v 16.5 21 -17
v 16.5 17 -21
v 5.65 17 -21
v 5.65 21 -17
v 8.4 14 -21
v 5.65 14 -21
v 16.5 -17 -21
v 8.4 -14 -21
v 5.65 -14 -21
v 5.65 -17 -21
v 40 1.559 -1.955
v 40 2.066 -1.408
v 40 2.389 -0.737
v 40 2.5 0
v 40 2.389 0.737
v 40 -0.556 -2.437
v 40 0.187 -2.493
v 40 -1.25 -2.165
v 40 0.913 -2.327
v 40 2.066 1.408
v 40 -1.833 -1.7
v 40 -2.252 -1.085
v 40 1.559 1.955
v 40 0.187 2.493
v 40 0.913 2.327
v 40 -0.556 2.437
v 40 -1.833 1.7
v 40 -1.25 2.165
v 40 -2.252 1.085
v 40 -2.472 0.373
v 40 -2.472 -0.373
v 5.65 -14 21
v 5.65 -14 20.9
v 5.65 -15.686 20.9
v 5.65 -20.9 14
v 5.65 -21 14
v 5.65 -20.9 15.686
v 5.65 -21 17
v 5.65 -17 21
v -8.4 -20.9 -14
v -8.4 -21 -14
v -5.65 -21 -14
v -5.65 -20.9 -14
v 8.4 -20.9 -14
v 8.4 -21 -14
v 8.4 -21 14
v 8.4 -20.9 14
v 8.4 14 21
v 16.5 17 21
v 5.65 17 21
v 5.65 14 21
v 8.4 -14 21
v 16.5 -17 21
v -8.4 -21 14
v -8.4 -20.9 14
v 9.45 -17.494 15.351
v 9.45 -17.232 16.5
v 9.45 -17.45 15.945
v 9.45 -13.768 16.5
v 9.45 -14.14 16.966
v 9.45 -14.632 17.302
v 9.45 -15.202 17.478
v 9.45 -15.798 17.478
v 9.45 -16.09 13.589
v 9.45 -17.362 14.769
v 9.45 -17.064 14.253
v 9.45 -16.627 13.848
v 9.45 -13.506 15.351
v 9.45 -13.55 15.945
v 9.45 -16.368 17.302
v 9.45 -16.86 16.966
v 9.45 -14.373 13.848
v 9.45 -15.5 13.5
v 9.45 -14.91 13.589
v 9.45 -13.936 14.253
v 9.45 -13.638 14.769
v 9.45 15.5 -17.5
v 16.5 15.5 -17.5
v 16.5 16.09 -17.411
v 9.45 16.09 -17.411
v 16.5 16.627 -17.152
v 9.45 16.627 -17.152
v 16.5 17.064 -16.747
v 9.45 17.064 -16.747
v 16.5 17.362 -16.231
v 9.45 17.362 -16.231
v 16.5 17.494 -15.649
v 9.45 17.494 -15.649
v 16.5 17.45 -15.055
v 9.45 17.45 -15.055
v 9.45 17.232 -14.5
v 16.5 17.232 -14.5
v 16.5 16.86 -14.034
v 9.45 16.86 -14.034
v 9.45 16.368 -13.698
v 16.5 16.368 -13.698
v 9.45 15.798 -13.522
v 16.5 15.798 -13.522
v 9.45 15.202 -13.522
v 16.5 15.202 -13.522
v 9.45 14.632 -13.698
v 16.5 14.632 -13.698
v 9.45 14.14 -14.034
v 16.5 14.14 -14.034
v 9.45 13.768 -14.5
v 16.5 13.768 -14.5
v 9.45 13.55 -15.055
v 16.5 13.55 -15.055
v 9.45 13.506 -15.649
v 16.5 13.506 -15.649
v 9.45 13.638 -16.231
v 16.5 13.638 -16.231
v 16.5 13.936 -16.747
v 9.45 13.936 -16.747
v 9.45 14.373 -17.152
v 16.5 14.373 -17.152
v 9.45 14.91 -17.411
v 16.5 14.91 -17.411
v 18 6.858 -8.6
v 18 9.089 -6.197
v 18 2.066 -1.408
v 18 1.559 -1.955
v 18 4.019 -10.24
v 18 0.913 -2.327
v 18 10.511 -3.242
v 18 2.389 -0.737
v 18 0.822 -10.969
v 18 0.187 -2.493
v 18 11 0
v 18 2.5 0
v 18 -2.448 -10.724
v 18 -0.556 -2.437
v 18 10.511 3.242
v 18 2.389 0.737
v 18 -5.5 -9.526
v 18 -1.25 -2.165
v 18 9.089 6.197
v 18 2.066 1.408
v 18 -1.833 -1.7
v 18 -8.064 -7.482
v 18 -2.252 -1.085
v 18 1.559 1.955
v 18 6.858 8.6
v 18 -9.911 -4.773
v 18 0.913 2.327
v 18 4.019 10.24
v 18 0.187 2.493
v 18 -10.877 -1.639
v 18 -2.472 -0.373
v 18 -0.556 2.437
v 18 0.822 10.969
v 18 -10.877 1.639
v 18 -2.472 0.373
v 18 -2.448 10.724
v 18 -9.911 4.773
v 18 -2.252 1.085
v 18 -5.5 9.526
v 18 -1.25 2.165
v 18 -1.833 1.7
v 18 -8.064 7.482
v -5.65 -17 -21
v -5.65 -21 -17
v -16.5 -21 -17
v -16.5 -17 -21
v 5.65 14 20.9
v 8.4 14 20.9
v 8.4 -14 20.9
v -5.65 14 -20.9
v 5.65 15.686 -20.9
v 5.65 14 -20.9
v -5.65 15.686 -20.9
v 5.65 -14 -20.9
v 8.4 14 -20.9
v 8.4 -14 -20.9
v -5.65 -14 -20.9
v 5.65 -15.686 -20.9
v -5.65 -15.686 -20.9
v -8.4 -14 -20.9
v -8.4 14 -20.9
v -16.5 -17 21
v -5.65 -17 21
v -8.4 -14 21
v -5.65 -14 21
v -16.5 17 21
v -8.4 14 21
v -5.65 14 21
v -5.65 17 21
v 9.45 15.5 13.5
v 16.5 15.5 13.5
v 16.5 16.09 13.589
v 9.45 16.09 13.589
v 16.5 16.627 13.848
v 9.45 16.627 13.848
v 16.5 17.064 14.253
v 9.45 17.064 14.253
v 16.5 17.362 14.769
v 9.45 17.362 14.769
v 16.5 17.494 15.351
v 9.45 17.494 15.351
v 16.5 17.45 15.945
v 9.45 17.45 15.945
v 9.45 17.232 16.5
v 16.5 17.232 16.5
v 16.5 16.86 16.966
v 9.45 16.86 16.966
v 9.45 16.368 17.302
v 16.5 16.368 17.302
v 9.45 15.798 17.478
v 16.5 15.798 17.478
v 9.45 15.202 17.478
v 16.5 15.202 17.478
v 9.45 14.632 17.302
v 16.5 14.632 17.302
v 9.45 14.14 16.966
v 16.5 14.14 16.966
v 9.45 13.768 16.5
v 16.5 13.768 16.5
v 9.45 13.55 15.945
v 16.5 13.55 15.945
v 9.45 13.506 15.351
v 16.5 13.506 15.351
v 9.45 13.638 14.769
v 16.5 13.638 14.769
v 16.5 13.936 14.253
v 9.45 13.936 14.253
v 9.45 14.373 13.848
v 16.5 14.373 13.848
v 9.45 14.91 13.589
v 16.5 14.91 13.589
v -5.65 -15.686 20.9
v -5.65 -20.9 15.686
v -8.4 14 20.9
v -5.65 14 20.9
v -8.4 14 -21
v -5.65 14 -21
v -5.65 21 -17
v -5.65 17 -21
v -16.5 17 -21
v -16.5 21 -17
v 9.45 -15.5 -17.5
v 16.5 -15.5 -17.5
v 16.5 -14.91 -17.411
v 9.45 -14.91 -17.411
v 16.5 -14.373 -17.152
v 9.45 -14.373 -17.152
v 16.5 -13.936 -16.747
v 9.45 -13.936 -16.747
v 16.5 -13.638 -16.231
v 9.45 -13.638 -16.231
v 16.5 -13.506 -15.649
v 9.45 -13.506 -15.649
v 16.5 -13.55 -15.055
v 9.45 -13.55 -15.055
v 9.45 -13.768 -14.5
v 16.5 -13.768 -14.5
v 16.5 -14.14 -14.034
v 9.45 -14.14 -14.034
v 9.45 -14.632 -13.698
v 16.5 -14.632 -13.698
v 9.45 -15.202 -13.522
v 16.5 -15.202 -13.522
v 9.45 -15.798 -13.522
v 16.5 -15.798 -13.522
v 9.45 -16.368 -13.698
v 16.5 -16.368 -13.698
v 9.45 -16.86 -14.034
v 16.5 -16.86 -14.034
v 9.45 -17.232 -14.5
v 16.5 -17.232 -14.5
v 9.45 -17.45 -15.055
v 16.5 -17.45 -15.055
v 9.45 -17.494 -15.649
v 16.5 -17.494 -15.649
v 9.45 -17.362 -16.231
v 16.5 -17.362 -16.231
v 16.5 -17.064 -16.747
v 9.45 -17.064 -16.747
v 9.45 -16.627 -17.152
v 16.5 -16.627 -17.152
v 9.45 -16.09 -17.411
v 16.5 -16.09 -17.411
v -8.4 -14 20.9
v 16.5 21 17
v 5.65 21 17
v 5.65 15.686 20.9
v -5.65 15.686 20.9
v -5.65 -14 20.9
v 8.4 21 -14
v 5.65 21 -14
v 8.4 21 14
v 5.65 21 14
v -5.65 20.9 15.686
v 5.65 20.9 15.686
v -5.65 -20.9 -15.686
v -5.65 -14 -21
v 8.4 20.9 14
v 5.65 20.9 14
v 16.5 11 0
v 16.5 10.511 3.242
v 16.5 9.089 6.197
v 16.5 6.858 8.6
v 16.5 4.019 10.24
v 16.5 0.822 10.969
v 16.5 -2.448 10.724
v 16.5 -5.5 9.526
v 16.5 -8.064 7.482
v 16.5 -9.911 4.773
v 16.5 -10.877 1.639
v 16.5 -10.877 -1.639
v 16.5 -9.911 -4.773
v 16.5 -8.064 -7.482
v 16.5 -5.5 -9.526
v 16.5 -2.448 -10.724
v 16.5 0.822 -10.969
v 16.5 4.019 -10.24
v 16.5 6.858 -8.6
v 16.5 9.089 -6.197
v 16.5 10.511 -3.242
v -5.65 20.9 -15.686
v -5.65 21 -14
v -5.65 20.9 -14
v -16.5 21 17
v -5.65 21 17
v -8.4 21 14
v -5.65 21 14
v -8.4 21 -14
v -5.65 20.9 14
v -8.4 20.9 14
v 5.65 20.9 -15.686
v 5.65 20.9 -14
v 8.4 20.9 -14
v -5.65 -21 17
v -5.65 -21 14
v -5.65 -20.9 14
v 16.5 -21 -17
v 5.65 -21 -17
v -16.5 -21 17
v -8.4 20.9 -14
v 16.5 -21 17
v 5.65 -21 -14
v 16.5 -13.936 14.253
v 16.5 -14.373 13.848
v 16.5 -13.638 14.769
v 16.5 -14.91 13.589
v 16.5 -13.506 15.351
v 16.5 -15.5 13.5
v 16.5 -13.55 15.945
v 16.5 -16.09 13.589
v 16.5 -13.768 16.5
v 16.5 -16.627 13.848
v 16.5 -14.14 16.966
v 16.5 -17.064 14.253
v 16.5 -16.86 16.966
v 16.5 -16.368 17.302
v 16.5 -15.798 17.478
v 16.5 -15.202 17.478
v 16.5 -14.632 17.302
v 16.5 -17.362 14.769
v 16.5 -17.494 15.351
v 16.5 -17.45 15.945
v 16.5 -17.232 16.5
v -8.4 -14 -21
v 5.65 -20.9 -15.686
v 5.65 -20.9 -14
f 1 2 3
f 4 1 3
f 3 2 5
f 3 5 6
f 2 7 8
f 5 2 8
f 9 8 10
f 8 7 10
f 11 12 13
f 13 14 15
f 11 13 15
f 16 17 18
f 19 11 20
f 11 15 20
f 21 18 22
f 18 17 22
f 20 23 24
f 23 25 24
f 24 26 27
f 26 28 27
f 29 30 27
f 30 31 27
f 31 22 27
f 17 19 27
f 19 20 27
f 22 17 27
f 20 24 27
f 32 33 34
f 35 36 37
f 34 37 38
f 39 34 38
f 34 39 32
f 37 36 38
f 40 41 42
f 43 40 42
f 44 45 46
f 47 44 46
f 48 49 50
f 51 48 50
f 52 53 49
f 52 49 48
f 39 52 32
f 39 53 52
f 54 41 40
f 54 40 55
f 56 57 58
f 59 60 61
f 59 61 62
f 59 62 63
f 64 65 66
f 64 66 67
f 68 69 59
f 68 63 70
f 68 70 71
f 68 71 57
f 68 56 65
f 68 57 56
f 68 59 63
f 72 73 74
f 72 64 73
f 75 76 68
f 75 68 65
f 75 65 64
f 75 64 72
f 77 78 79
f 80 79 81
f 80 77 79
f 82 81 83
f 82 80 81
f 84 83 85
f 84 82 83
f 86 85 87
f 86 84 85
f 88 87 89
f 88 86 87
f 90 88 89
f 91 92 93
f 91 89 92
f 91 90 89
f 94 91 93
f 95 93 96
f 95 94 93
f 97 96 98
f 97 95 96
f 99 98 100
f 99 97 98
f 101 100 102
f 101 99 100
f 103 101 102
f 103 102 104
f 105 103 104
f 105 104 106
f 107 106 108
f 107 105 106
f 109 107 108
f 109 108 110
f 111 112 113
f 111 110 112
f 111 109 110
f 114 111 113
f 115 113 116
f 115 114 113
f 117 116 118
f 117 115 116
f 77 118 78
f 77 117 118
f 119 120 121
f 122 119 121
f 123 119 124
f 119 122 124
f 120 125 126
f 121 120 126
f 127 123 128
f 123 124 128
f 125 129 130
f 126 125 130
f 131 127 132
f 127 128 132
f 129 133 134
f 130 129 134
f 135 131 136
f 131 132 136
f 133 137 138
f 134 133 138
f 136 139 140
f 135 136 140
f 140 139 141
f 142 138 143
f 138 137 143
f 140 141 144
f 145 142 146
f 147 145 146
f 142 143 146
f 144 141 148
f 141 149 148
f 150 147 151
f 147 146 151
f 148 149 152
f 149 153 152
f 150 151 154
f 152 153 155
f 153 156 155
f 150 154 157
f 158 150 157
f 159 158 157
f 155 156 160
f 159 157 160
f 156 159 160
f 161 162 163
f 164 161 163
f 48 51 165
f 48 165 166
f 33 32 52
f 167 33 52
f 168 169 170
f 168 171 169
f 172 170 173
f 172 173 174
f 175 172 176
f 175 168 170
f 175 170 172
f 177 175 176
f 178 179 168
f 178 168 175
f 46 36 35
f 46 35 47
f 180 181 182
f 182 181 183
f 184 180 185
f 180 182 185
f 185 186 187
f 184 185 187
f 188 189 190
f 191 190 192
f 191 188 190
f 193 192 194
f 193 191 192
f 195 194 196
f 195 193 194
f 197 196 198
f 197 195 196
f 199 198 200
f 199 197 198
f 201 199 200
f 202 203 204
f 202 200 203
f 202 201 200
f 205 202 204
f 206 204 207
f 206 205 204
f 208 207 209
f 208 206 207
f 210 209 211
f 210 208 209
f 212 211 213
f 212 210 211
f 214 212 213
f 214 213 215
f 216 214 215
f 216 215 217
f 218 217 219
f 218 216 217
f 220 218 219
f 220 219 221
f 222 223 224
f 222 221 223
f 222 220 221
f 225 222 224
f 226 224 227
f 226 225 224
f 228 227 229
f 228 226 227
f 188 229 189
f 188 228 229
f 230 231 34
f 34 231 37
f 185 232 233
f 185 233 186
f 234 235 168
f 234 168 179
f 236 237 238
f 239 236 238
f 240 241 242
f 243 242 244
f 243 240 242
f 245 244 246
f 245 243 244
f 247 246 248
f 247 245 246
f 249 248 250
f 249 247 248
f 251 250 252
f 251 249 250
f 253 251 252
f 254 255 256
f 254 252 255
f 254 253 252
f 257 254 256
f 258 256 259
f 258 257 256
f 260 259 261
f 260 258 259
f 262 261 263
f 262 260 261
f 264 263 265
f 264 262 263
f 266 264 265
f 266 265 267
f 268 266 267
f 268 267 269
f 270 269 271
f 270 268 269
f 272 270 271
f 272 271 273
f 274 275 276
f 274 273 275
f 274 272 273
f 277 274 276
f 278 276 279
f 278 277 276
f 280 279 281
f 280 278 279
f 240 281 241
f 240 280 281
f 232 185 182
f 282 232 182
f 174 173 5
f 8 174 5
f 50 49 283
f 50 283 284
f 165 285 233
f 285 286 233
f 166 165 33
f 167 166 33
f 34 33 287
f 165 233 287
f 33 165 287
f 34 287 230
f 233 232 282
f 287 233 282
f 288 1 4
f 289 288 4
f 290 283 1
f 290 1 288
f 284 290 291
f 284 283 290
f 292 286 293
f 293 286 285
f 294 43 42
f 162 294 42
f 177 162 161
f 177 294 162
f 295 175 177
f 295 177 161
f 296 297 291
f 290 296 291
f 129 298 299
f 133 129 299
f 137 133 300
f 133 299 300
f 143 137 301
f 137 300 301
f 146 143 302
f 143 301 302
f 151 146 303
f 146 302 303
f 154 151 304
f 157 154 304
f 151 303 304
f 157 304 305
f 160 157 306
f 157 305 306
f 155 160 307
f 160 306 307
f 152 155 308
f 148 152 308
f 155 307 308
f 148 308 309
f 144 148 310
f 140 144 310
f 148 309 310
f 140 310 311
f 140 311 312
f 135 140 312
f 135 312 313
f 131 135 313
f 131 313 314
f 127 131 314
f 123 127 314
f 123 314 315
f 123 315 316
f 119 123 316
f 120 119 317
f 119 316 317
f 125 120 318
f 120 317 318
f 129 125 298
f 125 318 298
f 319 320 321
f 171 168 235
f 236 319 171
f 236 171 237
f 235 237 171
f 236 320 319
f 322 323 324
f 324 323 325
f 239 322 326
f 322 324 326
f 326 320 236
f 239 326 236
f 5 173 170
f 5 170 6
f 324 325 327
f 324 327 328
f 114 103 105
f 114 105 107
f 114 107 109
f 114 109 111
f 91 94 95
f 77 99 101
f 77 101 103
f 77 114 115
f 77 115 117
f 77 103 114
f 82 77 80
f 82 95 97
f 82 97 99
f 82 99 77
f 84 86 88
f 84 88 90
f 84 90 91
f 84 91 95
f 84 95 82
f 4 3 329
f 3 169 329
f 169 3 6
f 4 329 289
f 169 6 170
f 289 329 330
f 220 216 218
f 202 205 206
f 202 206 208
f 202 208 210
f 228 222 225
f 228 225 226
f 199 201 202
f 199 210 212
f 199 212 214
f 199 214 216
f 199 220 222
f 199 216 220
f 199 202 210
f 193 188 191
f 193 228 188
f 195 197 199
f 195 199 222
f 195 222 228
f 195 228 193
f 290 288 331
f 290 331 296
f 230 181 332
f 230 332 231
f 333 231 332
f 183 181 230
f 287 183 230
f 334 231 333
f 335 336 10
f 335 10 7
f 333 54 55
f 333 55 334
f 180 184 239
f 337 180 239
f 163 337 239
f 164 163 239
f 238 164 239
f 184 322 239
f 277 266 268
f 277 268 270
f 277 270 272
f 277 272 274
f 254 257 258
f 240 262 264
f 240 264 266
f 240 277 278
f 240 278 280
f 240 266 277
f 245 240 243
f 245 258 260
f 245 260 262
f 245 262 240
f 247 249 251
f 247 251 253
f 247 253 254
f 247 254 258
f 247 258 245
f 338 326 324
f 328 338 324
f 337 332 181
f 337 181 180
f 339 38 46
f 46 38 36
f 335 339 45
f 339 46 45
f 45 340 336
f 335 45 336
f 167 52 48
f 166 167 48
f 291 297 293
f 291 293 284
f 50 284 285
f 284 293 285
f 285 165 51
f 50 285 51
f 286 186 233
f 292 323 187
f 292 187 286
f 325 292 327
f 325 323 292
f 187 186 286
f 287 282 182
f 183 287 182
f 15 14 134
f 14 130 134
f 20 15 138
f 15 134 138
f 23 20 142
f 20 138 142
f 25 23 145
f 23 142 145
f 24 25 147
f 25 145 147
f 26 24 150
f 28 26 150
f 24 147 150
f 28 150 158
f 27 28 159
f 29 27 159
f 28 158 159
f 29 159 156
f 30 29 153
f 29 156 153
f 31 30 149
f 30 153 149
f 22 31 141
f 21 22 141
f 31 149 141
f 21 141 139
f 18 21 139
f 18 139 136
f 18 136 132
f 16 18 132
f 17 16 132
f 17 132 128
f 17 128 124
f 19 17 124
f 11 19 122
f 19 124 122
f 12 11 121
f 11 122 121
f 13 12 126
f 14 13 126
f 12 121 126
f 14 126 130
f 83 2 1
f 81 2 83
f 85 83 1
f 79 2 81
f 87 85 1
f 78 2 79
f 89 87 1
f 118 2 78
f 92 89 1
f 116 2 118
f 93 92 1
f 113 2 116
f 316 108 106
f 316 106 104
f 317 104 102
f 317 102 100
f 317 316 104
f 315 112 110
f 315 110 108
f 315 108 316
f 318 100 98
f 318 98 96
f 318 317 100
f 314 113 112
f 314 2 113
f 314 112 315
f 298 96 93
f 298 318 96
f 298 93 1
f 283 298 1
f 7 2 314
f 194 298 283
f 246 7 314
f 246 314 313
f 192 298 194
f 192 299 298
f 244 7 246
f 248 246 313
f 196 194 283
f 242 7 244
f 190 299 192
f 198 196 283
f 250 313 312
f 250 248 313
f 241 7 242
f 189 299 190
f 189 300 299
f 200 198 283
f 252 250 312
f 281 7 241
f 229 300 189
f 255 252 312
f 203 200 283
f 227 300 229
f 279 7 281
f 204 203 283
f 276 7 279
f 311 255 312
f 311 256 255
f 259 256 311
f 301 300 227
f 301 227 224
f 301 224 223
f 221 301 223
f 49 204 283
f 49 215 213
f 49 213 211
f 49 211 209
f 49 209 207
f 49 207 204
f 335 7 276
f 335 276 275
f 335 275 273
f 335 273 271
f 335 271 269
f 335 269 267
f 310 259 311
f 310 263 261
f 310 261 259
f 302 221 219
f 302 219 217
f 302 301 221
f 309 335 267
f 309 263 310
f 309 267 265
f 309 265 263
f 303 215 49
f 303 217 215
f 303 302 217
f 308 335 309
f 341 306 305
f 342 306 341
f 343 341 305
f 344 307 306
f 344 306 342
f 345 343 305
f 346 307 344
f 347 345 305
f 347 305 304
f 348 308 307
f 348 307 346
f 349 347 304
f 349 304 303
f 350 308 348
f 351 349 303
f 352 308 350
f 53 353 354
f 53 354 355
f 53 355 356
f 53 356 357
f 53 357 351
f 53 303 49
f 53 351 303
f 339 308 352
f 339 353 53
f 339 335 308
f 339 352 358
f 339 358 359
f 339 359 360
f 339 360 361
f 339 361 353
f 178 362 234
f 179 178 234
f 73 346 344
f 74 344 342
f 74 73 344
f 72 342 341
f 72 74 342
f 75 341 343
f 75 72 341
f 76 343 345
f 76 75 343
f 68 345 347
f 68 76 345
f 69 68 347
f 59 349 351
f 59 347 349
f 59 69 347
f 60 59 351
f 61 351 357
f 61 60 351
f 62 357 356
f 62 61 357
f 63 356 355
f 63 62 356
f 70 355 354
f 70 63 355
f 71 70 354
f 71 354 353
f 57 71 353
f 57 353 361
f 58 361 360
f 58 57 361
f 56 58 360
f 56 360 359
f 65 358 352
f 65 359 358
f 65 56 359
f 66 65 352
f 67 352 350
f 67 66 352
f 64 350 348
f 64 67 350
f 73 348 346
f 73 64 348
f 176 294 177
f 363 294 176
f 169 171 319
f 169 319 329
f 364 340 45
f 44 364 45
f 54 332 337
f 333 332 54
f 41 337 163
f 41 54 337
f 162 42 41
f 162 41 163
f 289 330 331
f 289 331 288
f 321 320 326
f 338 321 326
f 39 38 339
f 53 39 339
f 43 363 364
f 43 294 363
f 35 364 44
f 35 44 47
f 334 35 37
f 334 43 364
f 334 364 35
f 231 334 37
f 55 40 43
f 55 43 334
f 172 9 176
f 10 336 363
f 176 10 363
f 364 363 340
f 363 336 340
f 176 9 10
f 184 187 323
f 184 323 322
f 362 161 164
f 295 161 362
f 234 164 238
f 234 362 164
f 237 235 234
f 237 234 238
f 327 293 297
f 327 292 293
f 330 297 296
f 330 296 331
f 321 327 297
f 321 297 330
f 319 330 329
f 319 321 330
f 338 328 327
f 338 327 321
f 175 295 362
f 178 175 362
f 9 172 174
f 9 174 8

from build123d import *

# Parameters (mm, degrees)
CROQUIS1_W                  = 41.8
CROQUIS1_H                  = 41.8
SALIENTE_EXTRUIR1_DEPTH     = 11.3
CROQUIS2_W                  = 42
CROQUIS2_H                  = 41.9
SALIENTE_EXTRUIR2_DEPTH     = 10.85
CROQUIS3_W                  = 10.85
CROQUIS3_H                  = 42
SALIENTE_EXTRUIR3_DEPTH     = 0.1
CROQUIS4_W                  = 42
CROQUIS4_H                  = 42
SALIENTE_EXTRUIR4_DEPTH     = 10.85
CORTAR_EXTRUIR1_REACH       = 26.9
CROQUIS5_W                  = 0.1
CROQUIS5_H                  = 28
CORTAR_EXTRUIR2_REACH       = 26.9
CROQUIS6_W                  = 28
CROQUIS6_H                  = 0.1
CROQUIS7_W                  = 2.75
CROQUIS7_H                  = 28
CORTAR_EXTRUIR3_DEPTH       = 0.1
CROQUIS8_W                  = 2.75
CROQUIS8_H                  = 28
CORTAR_EXTRUIR4_DEPTH       = 0.1
CROQUIS9_W                  = 28
CROQUIS9_H                  = 0.1
CORTAR_EXTRUIR5_DEPTH       = 2.75
CROQUIS10_W                 = 2.75
CROQUIS10_H                 = 28
CORTAR_EXTRUIR6_DEPTH       = 0.1
CROQUIS11_W                 = 2.75
CROQUIS11_H                 = 28
CORTAR_EXTRUIR7_DEPTH       = 0.1
CROQUIS12_W                 = 2.75
CROQUIS12_H                 = 28
CORTAR_EXTRUIR8_DEPTH       = 0.1
CHAFL_N1_SIZE               = 5.214213562
CHAFL_N2_SIZE               = 4
CROQUIS18_R                 = 2
CORTAR_EXTRUIR10_DEPTH      = 6
CORTAR_EXTRUIR10_DEPTH_BACK = 3


with BuildPart() as part:
    # Croquis1 → Saliente-Extruir1 (new body)
    with BuildSketch(Plane(origin=(-5.65, 0, 0), x_dir=(0, -1, 0), z_dir=(-1, 0, 0))):
        Rectangle(CROQUIS1_W, CROQUIS1_H)
    extrude(amount=-SALIENTE_EXTRUIR1_DEPTH)

    # Croquis2 → Saliente-Extruir2 (add)
    with BuildSketch(Plane(origin=(5.65, 0, 0), x_dir=(0, 0, -1), z_dir=(1, 0, 0))):
        with Locations((0, -0.05)):
            Rectangle(CROQUIS2_W, CROQUIS2_H)
    extrude(amount=SALIENTE_EXTRUIR2_DEPTH)

    # Croquis3 → Saliente-Extruir3 (add)
    with BuildSketch(Plane(origin=(0, 20.9, 0), x_dir=(-1, 0, 0), z_dir=(0, 1, 0))):
        with Locations((-11.075, 0)):
            Rectangle(CROQUIS3_W, CROQUIS3_H)
    extrude(amount=SALIENTE_EXTRUIR3_DEPTH)

    # Croquis4 → Saliente-Extruir4 (add)
    with BuildSketch(Plane(origin=(-5.65, 0, 0), x_dir=(0, 0, -1), z_dir=(1, 0, 0))):
        Rectangle(CROQUIS4_W, CROQUIS4_H)
    extrude(amount=-SALIENTE_EXTRUIR4_DEPTH)

    # Croquis5 → Cortar-Extruir1 (cut, up to next)
    with BuildSketch(Plane(origin=(8.4, 0, 0), x_dir=(0, 0, -1), z_dir=(1, 0, 0)), mode=Mode.PRIVATE) as cortar_extruir1_sk1:
        with Locations((20.95, 0)):
            Rectangle(CROQUIS5_W, CROQUIS5_H)
    cortar_extruir1_tool1 = extrude(cortar_extruir1_sk1.sketch, amount=-CORTAR_EXTRUIR1_REACH, mode=Mode.PRIVATE) & part.part
    add(cortar_extruir1_tool1.solids().sort_by_distance((8.4, 0, -20.95))[0], mode=Mode.SUBTRACT)

    # Croquis6 → Cortar-Extruir2 (cut, up to next)
    with BuildSketch(Plane(origin=(-8.4, 0, 0), x_dir=(0, -1, 0), z_dir=(-1, 0, 0)), mode=Mode.PRIVATE) as cortar_extruir2_sk1:
        with Locations((0, 20.95)):
            Rectangle(CROQUIS6_W, CROQUIS6_H)
    cortar_extruir2_tool1 = extrude(cortar_extruir2_sk1.sketch, amount=-CORTAR_EXTRUIR2_REACH, mode=Mode.PRIVATE) & part.part
    add(cortar_extruir2_tool1.solids().sort_by_distance((-8.4, 0, 20.95))[0], mode=Mode.SUBTRACT)

    # Croquis7 → Cortar-Extruir3 (cut)
    with BuildSketch(Plane.XZ.offset(21)):
        with Locations((7.025, 0)):
            Rectangle(CROQUIS7_W, CROQUIS7_H)
    extrude(amount=-CORTAR_EXTRUIR3_DEPTH, mode=Mode.SUBTRACT)

    # Croquis8 → Cortar-Extruir4 (cut)
    with BuildSketch(Plane.XY.offset(21)):
        with Locations((7.025, 0)):
            Rectangle(CROQUIS8_W, CROQUIS8_H)
    extrude(amount=-CORTAR_EXTRUIR4_DEPTH, mode=Mode.SUBTRACT)

    # Croquis9 → Cortar-Extruir5 (cut)
    with BuildSketch(Plane.ZY.offset(-5.65)):
        with Locations((0, 20.95)):
            Rectangle(CROQUIS9_W, CROQUIS9_H)
    extrude(amount=-CORTAR_EXTRUIR5_DEPTH, mode=Mode.SUBTRACT)

    # Croquis10 → Cortar-Extruir6 (cut)
    with BuildSketch(Plane.XZ.offset(21)):
        with Locations((-7.025, 0)):
            Rectangle(CROQUIS10_W, CROQUIS10_H)
    extrude(amount=-CORTAR_EXTRUIR6_DEPTH, mode=Mode.SUBTRACT)

    # Croquis11 → Cortar-Extruir7 (cut)
    with BuildSketch(Plane(origin=(0, 0, -21), x_dir=(-1, 0, 0), z_dir=(0, 0, -1))):
        with Locations((7.025, 0)):
            Rectangle(CROQUIS11_W, CROQUIS11_H)
    extrude(amount=-CORTAR_EXTRUIR7_DEPTH, mode=Mode.SUBTRACT)

    # Croquis12 → Cortar-Extruir8 (cut)
    with BuildSketch(Plane(origin=(0, 21, 0), x_dir=(-1, 0, 0), z_dir=(0, 1, 0))):
        with Locations((7.025, 0)):
            Rectangle(CROQUIS12_W, CROQUIS12_H)
    extrude(amount=-CORTAR_EXTRUIR8_DEPTH, mode=Mode.SUBTRACT)

    # Croquis15 → Revolución1 (revolve)
    with BuildSketch(Plane.XY):
        Polygon((15.5, 11), (15.5, 0), (40, 0), (40, 2.5), (18, 2.5), (18, 11), align=None)
    revolve(axis=Axis((15.5, 0, 0), (1, 0, 0)))

    # Chaflán1
    chafl_n1_edges = [part.edges().sort_by_distance(p)[0] for p in [
        (0, -20.9, -20.9),
        (0, 20.9, 20.9),
        (0, 20.9, -20.9),
        (0, -20.9, 20.9),
    ]]
    chamfer(chafl_n1_edges, length=CHAFL_N1_SIZE)

    # Chaflán2
    chafl_n2_edges = [part.edges().sort_by_distance(p)[0] for p in [
        (11.075, -21, 21),
        (11.075, -21, -21),
        (11.075, 21, 21),
        (11.075, 21, -21),
        (-11.075, 21, -21),
        (-11.075, -21, -21),
        (-11.075, -21, 21),
        (-11.075, 21, 21),
    ]]
    chamfer(chafl_n2_edges, length=CHAFL_N2_SIZE)

    # Croquis18 → Cortar-Extruir10 (cut, two sides)
    with BuildSketch(Plane(origin=(12.45, 0, 0), x_dir=(0, 0, -1), z_dir=(1, 0, 0))) as cortar_extruir10_sk:
        with Locations((-15.5, 15.5)):
            Circle(CROQUIS18_R)
        with Locations((15.5, 15.5)):
            Circle(CROQUIS18_R)
        with Locations((15.5, -15.5)):
            Circle(CROQUIS18_R)
        with Locations((-15.5, -15.5)):
            Circle(CROQUIS18_R)
    extrude(amount=CORTAR_EXTRUIR10_DEPTH, mode=Mode.SUBTRACT)
    extrude(cortar_extruir10_sk.sketch, amount=-CORTAR_EXTRUIR10_DEPTH_BACK, mode=Mode.SUBTRACT)


solid = part.part
